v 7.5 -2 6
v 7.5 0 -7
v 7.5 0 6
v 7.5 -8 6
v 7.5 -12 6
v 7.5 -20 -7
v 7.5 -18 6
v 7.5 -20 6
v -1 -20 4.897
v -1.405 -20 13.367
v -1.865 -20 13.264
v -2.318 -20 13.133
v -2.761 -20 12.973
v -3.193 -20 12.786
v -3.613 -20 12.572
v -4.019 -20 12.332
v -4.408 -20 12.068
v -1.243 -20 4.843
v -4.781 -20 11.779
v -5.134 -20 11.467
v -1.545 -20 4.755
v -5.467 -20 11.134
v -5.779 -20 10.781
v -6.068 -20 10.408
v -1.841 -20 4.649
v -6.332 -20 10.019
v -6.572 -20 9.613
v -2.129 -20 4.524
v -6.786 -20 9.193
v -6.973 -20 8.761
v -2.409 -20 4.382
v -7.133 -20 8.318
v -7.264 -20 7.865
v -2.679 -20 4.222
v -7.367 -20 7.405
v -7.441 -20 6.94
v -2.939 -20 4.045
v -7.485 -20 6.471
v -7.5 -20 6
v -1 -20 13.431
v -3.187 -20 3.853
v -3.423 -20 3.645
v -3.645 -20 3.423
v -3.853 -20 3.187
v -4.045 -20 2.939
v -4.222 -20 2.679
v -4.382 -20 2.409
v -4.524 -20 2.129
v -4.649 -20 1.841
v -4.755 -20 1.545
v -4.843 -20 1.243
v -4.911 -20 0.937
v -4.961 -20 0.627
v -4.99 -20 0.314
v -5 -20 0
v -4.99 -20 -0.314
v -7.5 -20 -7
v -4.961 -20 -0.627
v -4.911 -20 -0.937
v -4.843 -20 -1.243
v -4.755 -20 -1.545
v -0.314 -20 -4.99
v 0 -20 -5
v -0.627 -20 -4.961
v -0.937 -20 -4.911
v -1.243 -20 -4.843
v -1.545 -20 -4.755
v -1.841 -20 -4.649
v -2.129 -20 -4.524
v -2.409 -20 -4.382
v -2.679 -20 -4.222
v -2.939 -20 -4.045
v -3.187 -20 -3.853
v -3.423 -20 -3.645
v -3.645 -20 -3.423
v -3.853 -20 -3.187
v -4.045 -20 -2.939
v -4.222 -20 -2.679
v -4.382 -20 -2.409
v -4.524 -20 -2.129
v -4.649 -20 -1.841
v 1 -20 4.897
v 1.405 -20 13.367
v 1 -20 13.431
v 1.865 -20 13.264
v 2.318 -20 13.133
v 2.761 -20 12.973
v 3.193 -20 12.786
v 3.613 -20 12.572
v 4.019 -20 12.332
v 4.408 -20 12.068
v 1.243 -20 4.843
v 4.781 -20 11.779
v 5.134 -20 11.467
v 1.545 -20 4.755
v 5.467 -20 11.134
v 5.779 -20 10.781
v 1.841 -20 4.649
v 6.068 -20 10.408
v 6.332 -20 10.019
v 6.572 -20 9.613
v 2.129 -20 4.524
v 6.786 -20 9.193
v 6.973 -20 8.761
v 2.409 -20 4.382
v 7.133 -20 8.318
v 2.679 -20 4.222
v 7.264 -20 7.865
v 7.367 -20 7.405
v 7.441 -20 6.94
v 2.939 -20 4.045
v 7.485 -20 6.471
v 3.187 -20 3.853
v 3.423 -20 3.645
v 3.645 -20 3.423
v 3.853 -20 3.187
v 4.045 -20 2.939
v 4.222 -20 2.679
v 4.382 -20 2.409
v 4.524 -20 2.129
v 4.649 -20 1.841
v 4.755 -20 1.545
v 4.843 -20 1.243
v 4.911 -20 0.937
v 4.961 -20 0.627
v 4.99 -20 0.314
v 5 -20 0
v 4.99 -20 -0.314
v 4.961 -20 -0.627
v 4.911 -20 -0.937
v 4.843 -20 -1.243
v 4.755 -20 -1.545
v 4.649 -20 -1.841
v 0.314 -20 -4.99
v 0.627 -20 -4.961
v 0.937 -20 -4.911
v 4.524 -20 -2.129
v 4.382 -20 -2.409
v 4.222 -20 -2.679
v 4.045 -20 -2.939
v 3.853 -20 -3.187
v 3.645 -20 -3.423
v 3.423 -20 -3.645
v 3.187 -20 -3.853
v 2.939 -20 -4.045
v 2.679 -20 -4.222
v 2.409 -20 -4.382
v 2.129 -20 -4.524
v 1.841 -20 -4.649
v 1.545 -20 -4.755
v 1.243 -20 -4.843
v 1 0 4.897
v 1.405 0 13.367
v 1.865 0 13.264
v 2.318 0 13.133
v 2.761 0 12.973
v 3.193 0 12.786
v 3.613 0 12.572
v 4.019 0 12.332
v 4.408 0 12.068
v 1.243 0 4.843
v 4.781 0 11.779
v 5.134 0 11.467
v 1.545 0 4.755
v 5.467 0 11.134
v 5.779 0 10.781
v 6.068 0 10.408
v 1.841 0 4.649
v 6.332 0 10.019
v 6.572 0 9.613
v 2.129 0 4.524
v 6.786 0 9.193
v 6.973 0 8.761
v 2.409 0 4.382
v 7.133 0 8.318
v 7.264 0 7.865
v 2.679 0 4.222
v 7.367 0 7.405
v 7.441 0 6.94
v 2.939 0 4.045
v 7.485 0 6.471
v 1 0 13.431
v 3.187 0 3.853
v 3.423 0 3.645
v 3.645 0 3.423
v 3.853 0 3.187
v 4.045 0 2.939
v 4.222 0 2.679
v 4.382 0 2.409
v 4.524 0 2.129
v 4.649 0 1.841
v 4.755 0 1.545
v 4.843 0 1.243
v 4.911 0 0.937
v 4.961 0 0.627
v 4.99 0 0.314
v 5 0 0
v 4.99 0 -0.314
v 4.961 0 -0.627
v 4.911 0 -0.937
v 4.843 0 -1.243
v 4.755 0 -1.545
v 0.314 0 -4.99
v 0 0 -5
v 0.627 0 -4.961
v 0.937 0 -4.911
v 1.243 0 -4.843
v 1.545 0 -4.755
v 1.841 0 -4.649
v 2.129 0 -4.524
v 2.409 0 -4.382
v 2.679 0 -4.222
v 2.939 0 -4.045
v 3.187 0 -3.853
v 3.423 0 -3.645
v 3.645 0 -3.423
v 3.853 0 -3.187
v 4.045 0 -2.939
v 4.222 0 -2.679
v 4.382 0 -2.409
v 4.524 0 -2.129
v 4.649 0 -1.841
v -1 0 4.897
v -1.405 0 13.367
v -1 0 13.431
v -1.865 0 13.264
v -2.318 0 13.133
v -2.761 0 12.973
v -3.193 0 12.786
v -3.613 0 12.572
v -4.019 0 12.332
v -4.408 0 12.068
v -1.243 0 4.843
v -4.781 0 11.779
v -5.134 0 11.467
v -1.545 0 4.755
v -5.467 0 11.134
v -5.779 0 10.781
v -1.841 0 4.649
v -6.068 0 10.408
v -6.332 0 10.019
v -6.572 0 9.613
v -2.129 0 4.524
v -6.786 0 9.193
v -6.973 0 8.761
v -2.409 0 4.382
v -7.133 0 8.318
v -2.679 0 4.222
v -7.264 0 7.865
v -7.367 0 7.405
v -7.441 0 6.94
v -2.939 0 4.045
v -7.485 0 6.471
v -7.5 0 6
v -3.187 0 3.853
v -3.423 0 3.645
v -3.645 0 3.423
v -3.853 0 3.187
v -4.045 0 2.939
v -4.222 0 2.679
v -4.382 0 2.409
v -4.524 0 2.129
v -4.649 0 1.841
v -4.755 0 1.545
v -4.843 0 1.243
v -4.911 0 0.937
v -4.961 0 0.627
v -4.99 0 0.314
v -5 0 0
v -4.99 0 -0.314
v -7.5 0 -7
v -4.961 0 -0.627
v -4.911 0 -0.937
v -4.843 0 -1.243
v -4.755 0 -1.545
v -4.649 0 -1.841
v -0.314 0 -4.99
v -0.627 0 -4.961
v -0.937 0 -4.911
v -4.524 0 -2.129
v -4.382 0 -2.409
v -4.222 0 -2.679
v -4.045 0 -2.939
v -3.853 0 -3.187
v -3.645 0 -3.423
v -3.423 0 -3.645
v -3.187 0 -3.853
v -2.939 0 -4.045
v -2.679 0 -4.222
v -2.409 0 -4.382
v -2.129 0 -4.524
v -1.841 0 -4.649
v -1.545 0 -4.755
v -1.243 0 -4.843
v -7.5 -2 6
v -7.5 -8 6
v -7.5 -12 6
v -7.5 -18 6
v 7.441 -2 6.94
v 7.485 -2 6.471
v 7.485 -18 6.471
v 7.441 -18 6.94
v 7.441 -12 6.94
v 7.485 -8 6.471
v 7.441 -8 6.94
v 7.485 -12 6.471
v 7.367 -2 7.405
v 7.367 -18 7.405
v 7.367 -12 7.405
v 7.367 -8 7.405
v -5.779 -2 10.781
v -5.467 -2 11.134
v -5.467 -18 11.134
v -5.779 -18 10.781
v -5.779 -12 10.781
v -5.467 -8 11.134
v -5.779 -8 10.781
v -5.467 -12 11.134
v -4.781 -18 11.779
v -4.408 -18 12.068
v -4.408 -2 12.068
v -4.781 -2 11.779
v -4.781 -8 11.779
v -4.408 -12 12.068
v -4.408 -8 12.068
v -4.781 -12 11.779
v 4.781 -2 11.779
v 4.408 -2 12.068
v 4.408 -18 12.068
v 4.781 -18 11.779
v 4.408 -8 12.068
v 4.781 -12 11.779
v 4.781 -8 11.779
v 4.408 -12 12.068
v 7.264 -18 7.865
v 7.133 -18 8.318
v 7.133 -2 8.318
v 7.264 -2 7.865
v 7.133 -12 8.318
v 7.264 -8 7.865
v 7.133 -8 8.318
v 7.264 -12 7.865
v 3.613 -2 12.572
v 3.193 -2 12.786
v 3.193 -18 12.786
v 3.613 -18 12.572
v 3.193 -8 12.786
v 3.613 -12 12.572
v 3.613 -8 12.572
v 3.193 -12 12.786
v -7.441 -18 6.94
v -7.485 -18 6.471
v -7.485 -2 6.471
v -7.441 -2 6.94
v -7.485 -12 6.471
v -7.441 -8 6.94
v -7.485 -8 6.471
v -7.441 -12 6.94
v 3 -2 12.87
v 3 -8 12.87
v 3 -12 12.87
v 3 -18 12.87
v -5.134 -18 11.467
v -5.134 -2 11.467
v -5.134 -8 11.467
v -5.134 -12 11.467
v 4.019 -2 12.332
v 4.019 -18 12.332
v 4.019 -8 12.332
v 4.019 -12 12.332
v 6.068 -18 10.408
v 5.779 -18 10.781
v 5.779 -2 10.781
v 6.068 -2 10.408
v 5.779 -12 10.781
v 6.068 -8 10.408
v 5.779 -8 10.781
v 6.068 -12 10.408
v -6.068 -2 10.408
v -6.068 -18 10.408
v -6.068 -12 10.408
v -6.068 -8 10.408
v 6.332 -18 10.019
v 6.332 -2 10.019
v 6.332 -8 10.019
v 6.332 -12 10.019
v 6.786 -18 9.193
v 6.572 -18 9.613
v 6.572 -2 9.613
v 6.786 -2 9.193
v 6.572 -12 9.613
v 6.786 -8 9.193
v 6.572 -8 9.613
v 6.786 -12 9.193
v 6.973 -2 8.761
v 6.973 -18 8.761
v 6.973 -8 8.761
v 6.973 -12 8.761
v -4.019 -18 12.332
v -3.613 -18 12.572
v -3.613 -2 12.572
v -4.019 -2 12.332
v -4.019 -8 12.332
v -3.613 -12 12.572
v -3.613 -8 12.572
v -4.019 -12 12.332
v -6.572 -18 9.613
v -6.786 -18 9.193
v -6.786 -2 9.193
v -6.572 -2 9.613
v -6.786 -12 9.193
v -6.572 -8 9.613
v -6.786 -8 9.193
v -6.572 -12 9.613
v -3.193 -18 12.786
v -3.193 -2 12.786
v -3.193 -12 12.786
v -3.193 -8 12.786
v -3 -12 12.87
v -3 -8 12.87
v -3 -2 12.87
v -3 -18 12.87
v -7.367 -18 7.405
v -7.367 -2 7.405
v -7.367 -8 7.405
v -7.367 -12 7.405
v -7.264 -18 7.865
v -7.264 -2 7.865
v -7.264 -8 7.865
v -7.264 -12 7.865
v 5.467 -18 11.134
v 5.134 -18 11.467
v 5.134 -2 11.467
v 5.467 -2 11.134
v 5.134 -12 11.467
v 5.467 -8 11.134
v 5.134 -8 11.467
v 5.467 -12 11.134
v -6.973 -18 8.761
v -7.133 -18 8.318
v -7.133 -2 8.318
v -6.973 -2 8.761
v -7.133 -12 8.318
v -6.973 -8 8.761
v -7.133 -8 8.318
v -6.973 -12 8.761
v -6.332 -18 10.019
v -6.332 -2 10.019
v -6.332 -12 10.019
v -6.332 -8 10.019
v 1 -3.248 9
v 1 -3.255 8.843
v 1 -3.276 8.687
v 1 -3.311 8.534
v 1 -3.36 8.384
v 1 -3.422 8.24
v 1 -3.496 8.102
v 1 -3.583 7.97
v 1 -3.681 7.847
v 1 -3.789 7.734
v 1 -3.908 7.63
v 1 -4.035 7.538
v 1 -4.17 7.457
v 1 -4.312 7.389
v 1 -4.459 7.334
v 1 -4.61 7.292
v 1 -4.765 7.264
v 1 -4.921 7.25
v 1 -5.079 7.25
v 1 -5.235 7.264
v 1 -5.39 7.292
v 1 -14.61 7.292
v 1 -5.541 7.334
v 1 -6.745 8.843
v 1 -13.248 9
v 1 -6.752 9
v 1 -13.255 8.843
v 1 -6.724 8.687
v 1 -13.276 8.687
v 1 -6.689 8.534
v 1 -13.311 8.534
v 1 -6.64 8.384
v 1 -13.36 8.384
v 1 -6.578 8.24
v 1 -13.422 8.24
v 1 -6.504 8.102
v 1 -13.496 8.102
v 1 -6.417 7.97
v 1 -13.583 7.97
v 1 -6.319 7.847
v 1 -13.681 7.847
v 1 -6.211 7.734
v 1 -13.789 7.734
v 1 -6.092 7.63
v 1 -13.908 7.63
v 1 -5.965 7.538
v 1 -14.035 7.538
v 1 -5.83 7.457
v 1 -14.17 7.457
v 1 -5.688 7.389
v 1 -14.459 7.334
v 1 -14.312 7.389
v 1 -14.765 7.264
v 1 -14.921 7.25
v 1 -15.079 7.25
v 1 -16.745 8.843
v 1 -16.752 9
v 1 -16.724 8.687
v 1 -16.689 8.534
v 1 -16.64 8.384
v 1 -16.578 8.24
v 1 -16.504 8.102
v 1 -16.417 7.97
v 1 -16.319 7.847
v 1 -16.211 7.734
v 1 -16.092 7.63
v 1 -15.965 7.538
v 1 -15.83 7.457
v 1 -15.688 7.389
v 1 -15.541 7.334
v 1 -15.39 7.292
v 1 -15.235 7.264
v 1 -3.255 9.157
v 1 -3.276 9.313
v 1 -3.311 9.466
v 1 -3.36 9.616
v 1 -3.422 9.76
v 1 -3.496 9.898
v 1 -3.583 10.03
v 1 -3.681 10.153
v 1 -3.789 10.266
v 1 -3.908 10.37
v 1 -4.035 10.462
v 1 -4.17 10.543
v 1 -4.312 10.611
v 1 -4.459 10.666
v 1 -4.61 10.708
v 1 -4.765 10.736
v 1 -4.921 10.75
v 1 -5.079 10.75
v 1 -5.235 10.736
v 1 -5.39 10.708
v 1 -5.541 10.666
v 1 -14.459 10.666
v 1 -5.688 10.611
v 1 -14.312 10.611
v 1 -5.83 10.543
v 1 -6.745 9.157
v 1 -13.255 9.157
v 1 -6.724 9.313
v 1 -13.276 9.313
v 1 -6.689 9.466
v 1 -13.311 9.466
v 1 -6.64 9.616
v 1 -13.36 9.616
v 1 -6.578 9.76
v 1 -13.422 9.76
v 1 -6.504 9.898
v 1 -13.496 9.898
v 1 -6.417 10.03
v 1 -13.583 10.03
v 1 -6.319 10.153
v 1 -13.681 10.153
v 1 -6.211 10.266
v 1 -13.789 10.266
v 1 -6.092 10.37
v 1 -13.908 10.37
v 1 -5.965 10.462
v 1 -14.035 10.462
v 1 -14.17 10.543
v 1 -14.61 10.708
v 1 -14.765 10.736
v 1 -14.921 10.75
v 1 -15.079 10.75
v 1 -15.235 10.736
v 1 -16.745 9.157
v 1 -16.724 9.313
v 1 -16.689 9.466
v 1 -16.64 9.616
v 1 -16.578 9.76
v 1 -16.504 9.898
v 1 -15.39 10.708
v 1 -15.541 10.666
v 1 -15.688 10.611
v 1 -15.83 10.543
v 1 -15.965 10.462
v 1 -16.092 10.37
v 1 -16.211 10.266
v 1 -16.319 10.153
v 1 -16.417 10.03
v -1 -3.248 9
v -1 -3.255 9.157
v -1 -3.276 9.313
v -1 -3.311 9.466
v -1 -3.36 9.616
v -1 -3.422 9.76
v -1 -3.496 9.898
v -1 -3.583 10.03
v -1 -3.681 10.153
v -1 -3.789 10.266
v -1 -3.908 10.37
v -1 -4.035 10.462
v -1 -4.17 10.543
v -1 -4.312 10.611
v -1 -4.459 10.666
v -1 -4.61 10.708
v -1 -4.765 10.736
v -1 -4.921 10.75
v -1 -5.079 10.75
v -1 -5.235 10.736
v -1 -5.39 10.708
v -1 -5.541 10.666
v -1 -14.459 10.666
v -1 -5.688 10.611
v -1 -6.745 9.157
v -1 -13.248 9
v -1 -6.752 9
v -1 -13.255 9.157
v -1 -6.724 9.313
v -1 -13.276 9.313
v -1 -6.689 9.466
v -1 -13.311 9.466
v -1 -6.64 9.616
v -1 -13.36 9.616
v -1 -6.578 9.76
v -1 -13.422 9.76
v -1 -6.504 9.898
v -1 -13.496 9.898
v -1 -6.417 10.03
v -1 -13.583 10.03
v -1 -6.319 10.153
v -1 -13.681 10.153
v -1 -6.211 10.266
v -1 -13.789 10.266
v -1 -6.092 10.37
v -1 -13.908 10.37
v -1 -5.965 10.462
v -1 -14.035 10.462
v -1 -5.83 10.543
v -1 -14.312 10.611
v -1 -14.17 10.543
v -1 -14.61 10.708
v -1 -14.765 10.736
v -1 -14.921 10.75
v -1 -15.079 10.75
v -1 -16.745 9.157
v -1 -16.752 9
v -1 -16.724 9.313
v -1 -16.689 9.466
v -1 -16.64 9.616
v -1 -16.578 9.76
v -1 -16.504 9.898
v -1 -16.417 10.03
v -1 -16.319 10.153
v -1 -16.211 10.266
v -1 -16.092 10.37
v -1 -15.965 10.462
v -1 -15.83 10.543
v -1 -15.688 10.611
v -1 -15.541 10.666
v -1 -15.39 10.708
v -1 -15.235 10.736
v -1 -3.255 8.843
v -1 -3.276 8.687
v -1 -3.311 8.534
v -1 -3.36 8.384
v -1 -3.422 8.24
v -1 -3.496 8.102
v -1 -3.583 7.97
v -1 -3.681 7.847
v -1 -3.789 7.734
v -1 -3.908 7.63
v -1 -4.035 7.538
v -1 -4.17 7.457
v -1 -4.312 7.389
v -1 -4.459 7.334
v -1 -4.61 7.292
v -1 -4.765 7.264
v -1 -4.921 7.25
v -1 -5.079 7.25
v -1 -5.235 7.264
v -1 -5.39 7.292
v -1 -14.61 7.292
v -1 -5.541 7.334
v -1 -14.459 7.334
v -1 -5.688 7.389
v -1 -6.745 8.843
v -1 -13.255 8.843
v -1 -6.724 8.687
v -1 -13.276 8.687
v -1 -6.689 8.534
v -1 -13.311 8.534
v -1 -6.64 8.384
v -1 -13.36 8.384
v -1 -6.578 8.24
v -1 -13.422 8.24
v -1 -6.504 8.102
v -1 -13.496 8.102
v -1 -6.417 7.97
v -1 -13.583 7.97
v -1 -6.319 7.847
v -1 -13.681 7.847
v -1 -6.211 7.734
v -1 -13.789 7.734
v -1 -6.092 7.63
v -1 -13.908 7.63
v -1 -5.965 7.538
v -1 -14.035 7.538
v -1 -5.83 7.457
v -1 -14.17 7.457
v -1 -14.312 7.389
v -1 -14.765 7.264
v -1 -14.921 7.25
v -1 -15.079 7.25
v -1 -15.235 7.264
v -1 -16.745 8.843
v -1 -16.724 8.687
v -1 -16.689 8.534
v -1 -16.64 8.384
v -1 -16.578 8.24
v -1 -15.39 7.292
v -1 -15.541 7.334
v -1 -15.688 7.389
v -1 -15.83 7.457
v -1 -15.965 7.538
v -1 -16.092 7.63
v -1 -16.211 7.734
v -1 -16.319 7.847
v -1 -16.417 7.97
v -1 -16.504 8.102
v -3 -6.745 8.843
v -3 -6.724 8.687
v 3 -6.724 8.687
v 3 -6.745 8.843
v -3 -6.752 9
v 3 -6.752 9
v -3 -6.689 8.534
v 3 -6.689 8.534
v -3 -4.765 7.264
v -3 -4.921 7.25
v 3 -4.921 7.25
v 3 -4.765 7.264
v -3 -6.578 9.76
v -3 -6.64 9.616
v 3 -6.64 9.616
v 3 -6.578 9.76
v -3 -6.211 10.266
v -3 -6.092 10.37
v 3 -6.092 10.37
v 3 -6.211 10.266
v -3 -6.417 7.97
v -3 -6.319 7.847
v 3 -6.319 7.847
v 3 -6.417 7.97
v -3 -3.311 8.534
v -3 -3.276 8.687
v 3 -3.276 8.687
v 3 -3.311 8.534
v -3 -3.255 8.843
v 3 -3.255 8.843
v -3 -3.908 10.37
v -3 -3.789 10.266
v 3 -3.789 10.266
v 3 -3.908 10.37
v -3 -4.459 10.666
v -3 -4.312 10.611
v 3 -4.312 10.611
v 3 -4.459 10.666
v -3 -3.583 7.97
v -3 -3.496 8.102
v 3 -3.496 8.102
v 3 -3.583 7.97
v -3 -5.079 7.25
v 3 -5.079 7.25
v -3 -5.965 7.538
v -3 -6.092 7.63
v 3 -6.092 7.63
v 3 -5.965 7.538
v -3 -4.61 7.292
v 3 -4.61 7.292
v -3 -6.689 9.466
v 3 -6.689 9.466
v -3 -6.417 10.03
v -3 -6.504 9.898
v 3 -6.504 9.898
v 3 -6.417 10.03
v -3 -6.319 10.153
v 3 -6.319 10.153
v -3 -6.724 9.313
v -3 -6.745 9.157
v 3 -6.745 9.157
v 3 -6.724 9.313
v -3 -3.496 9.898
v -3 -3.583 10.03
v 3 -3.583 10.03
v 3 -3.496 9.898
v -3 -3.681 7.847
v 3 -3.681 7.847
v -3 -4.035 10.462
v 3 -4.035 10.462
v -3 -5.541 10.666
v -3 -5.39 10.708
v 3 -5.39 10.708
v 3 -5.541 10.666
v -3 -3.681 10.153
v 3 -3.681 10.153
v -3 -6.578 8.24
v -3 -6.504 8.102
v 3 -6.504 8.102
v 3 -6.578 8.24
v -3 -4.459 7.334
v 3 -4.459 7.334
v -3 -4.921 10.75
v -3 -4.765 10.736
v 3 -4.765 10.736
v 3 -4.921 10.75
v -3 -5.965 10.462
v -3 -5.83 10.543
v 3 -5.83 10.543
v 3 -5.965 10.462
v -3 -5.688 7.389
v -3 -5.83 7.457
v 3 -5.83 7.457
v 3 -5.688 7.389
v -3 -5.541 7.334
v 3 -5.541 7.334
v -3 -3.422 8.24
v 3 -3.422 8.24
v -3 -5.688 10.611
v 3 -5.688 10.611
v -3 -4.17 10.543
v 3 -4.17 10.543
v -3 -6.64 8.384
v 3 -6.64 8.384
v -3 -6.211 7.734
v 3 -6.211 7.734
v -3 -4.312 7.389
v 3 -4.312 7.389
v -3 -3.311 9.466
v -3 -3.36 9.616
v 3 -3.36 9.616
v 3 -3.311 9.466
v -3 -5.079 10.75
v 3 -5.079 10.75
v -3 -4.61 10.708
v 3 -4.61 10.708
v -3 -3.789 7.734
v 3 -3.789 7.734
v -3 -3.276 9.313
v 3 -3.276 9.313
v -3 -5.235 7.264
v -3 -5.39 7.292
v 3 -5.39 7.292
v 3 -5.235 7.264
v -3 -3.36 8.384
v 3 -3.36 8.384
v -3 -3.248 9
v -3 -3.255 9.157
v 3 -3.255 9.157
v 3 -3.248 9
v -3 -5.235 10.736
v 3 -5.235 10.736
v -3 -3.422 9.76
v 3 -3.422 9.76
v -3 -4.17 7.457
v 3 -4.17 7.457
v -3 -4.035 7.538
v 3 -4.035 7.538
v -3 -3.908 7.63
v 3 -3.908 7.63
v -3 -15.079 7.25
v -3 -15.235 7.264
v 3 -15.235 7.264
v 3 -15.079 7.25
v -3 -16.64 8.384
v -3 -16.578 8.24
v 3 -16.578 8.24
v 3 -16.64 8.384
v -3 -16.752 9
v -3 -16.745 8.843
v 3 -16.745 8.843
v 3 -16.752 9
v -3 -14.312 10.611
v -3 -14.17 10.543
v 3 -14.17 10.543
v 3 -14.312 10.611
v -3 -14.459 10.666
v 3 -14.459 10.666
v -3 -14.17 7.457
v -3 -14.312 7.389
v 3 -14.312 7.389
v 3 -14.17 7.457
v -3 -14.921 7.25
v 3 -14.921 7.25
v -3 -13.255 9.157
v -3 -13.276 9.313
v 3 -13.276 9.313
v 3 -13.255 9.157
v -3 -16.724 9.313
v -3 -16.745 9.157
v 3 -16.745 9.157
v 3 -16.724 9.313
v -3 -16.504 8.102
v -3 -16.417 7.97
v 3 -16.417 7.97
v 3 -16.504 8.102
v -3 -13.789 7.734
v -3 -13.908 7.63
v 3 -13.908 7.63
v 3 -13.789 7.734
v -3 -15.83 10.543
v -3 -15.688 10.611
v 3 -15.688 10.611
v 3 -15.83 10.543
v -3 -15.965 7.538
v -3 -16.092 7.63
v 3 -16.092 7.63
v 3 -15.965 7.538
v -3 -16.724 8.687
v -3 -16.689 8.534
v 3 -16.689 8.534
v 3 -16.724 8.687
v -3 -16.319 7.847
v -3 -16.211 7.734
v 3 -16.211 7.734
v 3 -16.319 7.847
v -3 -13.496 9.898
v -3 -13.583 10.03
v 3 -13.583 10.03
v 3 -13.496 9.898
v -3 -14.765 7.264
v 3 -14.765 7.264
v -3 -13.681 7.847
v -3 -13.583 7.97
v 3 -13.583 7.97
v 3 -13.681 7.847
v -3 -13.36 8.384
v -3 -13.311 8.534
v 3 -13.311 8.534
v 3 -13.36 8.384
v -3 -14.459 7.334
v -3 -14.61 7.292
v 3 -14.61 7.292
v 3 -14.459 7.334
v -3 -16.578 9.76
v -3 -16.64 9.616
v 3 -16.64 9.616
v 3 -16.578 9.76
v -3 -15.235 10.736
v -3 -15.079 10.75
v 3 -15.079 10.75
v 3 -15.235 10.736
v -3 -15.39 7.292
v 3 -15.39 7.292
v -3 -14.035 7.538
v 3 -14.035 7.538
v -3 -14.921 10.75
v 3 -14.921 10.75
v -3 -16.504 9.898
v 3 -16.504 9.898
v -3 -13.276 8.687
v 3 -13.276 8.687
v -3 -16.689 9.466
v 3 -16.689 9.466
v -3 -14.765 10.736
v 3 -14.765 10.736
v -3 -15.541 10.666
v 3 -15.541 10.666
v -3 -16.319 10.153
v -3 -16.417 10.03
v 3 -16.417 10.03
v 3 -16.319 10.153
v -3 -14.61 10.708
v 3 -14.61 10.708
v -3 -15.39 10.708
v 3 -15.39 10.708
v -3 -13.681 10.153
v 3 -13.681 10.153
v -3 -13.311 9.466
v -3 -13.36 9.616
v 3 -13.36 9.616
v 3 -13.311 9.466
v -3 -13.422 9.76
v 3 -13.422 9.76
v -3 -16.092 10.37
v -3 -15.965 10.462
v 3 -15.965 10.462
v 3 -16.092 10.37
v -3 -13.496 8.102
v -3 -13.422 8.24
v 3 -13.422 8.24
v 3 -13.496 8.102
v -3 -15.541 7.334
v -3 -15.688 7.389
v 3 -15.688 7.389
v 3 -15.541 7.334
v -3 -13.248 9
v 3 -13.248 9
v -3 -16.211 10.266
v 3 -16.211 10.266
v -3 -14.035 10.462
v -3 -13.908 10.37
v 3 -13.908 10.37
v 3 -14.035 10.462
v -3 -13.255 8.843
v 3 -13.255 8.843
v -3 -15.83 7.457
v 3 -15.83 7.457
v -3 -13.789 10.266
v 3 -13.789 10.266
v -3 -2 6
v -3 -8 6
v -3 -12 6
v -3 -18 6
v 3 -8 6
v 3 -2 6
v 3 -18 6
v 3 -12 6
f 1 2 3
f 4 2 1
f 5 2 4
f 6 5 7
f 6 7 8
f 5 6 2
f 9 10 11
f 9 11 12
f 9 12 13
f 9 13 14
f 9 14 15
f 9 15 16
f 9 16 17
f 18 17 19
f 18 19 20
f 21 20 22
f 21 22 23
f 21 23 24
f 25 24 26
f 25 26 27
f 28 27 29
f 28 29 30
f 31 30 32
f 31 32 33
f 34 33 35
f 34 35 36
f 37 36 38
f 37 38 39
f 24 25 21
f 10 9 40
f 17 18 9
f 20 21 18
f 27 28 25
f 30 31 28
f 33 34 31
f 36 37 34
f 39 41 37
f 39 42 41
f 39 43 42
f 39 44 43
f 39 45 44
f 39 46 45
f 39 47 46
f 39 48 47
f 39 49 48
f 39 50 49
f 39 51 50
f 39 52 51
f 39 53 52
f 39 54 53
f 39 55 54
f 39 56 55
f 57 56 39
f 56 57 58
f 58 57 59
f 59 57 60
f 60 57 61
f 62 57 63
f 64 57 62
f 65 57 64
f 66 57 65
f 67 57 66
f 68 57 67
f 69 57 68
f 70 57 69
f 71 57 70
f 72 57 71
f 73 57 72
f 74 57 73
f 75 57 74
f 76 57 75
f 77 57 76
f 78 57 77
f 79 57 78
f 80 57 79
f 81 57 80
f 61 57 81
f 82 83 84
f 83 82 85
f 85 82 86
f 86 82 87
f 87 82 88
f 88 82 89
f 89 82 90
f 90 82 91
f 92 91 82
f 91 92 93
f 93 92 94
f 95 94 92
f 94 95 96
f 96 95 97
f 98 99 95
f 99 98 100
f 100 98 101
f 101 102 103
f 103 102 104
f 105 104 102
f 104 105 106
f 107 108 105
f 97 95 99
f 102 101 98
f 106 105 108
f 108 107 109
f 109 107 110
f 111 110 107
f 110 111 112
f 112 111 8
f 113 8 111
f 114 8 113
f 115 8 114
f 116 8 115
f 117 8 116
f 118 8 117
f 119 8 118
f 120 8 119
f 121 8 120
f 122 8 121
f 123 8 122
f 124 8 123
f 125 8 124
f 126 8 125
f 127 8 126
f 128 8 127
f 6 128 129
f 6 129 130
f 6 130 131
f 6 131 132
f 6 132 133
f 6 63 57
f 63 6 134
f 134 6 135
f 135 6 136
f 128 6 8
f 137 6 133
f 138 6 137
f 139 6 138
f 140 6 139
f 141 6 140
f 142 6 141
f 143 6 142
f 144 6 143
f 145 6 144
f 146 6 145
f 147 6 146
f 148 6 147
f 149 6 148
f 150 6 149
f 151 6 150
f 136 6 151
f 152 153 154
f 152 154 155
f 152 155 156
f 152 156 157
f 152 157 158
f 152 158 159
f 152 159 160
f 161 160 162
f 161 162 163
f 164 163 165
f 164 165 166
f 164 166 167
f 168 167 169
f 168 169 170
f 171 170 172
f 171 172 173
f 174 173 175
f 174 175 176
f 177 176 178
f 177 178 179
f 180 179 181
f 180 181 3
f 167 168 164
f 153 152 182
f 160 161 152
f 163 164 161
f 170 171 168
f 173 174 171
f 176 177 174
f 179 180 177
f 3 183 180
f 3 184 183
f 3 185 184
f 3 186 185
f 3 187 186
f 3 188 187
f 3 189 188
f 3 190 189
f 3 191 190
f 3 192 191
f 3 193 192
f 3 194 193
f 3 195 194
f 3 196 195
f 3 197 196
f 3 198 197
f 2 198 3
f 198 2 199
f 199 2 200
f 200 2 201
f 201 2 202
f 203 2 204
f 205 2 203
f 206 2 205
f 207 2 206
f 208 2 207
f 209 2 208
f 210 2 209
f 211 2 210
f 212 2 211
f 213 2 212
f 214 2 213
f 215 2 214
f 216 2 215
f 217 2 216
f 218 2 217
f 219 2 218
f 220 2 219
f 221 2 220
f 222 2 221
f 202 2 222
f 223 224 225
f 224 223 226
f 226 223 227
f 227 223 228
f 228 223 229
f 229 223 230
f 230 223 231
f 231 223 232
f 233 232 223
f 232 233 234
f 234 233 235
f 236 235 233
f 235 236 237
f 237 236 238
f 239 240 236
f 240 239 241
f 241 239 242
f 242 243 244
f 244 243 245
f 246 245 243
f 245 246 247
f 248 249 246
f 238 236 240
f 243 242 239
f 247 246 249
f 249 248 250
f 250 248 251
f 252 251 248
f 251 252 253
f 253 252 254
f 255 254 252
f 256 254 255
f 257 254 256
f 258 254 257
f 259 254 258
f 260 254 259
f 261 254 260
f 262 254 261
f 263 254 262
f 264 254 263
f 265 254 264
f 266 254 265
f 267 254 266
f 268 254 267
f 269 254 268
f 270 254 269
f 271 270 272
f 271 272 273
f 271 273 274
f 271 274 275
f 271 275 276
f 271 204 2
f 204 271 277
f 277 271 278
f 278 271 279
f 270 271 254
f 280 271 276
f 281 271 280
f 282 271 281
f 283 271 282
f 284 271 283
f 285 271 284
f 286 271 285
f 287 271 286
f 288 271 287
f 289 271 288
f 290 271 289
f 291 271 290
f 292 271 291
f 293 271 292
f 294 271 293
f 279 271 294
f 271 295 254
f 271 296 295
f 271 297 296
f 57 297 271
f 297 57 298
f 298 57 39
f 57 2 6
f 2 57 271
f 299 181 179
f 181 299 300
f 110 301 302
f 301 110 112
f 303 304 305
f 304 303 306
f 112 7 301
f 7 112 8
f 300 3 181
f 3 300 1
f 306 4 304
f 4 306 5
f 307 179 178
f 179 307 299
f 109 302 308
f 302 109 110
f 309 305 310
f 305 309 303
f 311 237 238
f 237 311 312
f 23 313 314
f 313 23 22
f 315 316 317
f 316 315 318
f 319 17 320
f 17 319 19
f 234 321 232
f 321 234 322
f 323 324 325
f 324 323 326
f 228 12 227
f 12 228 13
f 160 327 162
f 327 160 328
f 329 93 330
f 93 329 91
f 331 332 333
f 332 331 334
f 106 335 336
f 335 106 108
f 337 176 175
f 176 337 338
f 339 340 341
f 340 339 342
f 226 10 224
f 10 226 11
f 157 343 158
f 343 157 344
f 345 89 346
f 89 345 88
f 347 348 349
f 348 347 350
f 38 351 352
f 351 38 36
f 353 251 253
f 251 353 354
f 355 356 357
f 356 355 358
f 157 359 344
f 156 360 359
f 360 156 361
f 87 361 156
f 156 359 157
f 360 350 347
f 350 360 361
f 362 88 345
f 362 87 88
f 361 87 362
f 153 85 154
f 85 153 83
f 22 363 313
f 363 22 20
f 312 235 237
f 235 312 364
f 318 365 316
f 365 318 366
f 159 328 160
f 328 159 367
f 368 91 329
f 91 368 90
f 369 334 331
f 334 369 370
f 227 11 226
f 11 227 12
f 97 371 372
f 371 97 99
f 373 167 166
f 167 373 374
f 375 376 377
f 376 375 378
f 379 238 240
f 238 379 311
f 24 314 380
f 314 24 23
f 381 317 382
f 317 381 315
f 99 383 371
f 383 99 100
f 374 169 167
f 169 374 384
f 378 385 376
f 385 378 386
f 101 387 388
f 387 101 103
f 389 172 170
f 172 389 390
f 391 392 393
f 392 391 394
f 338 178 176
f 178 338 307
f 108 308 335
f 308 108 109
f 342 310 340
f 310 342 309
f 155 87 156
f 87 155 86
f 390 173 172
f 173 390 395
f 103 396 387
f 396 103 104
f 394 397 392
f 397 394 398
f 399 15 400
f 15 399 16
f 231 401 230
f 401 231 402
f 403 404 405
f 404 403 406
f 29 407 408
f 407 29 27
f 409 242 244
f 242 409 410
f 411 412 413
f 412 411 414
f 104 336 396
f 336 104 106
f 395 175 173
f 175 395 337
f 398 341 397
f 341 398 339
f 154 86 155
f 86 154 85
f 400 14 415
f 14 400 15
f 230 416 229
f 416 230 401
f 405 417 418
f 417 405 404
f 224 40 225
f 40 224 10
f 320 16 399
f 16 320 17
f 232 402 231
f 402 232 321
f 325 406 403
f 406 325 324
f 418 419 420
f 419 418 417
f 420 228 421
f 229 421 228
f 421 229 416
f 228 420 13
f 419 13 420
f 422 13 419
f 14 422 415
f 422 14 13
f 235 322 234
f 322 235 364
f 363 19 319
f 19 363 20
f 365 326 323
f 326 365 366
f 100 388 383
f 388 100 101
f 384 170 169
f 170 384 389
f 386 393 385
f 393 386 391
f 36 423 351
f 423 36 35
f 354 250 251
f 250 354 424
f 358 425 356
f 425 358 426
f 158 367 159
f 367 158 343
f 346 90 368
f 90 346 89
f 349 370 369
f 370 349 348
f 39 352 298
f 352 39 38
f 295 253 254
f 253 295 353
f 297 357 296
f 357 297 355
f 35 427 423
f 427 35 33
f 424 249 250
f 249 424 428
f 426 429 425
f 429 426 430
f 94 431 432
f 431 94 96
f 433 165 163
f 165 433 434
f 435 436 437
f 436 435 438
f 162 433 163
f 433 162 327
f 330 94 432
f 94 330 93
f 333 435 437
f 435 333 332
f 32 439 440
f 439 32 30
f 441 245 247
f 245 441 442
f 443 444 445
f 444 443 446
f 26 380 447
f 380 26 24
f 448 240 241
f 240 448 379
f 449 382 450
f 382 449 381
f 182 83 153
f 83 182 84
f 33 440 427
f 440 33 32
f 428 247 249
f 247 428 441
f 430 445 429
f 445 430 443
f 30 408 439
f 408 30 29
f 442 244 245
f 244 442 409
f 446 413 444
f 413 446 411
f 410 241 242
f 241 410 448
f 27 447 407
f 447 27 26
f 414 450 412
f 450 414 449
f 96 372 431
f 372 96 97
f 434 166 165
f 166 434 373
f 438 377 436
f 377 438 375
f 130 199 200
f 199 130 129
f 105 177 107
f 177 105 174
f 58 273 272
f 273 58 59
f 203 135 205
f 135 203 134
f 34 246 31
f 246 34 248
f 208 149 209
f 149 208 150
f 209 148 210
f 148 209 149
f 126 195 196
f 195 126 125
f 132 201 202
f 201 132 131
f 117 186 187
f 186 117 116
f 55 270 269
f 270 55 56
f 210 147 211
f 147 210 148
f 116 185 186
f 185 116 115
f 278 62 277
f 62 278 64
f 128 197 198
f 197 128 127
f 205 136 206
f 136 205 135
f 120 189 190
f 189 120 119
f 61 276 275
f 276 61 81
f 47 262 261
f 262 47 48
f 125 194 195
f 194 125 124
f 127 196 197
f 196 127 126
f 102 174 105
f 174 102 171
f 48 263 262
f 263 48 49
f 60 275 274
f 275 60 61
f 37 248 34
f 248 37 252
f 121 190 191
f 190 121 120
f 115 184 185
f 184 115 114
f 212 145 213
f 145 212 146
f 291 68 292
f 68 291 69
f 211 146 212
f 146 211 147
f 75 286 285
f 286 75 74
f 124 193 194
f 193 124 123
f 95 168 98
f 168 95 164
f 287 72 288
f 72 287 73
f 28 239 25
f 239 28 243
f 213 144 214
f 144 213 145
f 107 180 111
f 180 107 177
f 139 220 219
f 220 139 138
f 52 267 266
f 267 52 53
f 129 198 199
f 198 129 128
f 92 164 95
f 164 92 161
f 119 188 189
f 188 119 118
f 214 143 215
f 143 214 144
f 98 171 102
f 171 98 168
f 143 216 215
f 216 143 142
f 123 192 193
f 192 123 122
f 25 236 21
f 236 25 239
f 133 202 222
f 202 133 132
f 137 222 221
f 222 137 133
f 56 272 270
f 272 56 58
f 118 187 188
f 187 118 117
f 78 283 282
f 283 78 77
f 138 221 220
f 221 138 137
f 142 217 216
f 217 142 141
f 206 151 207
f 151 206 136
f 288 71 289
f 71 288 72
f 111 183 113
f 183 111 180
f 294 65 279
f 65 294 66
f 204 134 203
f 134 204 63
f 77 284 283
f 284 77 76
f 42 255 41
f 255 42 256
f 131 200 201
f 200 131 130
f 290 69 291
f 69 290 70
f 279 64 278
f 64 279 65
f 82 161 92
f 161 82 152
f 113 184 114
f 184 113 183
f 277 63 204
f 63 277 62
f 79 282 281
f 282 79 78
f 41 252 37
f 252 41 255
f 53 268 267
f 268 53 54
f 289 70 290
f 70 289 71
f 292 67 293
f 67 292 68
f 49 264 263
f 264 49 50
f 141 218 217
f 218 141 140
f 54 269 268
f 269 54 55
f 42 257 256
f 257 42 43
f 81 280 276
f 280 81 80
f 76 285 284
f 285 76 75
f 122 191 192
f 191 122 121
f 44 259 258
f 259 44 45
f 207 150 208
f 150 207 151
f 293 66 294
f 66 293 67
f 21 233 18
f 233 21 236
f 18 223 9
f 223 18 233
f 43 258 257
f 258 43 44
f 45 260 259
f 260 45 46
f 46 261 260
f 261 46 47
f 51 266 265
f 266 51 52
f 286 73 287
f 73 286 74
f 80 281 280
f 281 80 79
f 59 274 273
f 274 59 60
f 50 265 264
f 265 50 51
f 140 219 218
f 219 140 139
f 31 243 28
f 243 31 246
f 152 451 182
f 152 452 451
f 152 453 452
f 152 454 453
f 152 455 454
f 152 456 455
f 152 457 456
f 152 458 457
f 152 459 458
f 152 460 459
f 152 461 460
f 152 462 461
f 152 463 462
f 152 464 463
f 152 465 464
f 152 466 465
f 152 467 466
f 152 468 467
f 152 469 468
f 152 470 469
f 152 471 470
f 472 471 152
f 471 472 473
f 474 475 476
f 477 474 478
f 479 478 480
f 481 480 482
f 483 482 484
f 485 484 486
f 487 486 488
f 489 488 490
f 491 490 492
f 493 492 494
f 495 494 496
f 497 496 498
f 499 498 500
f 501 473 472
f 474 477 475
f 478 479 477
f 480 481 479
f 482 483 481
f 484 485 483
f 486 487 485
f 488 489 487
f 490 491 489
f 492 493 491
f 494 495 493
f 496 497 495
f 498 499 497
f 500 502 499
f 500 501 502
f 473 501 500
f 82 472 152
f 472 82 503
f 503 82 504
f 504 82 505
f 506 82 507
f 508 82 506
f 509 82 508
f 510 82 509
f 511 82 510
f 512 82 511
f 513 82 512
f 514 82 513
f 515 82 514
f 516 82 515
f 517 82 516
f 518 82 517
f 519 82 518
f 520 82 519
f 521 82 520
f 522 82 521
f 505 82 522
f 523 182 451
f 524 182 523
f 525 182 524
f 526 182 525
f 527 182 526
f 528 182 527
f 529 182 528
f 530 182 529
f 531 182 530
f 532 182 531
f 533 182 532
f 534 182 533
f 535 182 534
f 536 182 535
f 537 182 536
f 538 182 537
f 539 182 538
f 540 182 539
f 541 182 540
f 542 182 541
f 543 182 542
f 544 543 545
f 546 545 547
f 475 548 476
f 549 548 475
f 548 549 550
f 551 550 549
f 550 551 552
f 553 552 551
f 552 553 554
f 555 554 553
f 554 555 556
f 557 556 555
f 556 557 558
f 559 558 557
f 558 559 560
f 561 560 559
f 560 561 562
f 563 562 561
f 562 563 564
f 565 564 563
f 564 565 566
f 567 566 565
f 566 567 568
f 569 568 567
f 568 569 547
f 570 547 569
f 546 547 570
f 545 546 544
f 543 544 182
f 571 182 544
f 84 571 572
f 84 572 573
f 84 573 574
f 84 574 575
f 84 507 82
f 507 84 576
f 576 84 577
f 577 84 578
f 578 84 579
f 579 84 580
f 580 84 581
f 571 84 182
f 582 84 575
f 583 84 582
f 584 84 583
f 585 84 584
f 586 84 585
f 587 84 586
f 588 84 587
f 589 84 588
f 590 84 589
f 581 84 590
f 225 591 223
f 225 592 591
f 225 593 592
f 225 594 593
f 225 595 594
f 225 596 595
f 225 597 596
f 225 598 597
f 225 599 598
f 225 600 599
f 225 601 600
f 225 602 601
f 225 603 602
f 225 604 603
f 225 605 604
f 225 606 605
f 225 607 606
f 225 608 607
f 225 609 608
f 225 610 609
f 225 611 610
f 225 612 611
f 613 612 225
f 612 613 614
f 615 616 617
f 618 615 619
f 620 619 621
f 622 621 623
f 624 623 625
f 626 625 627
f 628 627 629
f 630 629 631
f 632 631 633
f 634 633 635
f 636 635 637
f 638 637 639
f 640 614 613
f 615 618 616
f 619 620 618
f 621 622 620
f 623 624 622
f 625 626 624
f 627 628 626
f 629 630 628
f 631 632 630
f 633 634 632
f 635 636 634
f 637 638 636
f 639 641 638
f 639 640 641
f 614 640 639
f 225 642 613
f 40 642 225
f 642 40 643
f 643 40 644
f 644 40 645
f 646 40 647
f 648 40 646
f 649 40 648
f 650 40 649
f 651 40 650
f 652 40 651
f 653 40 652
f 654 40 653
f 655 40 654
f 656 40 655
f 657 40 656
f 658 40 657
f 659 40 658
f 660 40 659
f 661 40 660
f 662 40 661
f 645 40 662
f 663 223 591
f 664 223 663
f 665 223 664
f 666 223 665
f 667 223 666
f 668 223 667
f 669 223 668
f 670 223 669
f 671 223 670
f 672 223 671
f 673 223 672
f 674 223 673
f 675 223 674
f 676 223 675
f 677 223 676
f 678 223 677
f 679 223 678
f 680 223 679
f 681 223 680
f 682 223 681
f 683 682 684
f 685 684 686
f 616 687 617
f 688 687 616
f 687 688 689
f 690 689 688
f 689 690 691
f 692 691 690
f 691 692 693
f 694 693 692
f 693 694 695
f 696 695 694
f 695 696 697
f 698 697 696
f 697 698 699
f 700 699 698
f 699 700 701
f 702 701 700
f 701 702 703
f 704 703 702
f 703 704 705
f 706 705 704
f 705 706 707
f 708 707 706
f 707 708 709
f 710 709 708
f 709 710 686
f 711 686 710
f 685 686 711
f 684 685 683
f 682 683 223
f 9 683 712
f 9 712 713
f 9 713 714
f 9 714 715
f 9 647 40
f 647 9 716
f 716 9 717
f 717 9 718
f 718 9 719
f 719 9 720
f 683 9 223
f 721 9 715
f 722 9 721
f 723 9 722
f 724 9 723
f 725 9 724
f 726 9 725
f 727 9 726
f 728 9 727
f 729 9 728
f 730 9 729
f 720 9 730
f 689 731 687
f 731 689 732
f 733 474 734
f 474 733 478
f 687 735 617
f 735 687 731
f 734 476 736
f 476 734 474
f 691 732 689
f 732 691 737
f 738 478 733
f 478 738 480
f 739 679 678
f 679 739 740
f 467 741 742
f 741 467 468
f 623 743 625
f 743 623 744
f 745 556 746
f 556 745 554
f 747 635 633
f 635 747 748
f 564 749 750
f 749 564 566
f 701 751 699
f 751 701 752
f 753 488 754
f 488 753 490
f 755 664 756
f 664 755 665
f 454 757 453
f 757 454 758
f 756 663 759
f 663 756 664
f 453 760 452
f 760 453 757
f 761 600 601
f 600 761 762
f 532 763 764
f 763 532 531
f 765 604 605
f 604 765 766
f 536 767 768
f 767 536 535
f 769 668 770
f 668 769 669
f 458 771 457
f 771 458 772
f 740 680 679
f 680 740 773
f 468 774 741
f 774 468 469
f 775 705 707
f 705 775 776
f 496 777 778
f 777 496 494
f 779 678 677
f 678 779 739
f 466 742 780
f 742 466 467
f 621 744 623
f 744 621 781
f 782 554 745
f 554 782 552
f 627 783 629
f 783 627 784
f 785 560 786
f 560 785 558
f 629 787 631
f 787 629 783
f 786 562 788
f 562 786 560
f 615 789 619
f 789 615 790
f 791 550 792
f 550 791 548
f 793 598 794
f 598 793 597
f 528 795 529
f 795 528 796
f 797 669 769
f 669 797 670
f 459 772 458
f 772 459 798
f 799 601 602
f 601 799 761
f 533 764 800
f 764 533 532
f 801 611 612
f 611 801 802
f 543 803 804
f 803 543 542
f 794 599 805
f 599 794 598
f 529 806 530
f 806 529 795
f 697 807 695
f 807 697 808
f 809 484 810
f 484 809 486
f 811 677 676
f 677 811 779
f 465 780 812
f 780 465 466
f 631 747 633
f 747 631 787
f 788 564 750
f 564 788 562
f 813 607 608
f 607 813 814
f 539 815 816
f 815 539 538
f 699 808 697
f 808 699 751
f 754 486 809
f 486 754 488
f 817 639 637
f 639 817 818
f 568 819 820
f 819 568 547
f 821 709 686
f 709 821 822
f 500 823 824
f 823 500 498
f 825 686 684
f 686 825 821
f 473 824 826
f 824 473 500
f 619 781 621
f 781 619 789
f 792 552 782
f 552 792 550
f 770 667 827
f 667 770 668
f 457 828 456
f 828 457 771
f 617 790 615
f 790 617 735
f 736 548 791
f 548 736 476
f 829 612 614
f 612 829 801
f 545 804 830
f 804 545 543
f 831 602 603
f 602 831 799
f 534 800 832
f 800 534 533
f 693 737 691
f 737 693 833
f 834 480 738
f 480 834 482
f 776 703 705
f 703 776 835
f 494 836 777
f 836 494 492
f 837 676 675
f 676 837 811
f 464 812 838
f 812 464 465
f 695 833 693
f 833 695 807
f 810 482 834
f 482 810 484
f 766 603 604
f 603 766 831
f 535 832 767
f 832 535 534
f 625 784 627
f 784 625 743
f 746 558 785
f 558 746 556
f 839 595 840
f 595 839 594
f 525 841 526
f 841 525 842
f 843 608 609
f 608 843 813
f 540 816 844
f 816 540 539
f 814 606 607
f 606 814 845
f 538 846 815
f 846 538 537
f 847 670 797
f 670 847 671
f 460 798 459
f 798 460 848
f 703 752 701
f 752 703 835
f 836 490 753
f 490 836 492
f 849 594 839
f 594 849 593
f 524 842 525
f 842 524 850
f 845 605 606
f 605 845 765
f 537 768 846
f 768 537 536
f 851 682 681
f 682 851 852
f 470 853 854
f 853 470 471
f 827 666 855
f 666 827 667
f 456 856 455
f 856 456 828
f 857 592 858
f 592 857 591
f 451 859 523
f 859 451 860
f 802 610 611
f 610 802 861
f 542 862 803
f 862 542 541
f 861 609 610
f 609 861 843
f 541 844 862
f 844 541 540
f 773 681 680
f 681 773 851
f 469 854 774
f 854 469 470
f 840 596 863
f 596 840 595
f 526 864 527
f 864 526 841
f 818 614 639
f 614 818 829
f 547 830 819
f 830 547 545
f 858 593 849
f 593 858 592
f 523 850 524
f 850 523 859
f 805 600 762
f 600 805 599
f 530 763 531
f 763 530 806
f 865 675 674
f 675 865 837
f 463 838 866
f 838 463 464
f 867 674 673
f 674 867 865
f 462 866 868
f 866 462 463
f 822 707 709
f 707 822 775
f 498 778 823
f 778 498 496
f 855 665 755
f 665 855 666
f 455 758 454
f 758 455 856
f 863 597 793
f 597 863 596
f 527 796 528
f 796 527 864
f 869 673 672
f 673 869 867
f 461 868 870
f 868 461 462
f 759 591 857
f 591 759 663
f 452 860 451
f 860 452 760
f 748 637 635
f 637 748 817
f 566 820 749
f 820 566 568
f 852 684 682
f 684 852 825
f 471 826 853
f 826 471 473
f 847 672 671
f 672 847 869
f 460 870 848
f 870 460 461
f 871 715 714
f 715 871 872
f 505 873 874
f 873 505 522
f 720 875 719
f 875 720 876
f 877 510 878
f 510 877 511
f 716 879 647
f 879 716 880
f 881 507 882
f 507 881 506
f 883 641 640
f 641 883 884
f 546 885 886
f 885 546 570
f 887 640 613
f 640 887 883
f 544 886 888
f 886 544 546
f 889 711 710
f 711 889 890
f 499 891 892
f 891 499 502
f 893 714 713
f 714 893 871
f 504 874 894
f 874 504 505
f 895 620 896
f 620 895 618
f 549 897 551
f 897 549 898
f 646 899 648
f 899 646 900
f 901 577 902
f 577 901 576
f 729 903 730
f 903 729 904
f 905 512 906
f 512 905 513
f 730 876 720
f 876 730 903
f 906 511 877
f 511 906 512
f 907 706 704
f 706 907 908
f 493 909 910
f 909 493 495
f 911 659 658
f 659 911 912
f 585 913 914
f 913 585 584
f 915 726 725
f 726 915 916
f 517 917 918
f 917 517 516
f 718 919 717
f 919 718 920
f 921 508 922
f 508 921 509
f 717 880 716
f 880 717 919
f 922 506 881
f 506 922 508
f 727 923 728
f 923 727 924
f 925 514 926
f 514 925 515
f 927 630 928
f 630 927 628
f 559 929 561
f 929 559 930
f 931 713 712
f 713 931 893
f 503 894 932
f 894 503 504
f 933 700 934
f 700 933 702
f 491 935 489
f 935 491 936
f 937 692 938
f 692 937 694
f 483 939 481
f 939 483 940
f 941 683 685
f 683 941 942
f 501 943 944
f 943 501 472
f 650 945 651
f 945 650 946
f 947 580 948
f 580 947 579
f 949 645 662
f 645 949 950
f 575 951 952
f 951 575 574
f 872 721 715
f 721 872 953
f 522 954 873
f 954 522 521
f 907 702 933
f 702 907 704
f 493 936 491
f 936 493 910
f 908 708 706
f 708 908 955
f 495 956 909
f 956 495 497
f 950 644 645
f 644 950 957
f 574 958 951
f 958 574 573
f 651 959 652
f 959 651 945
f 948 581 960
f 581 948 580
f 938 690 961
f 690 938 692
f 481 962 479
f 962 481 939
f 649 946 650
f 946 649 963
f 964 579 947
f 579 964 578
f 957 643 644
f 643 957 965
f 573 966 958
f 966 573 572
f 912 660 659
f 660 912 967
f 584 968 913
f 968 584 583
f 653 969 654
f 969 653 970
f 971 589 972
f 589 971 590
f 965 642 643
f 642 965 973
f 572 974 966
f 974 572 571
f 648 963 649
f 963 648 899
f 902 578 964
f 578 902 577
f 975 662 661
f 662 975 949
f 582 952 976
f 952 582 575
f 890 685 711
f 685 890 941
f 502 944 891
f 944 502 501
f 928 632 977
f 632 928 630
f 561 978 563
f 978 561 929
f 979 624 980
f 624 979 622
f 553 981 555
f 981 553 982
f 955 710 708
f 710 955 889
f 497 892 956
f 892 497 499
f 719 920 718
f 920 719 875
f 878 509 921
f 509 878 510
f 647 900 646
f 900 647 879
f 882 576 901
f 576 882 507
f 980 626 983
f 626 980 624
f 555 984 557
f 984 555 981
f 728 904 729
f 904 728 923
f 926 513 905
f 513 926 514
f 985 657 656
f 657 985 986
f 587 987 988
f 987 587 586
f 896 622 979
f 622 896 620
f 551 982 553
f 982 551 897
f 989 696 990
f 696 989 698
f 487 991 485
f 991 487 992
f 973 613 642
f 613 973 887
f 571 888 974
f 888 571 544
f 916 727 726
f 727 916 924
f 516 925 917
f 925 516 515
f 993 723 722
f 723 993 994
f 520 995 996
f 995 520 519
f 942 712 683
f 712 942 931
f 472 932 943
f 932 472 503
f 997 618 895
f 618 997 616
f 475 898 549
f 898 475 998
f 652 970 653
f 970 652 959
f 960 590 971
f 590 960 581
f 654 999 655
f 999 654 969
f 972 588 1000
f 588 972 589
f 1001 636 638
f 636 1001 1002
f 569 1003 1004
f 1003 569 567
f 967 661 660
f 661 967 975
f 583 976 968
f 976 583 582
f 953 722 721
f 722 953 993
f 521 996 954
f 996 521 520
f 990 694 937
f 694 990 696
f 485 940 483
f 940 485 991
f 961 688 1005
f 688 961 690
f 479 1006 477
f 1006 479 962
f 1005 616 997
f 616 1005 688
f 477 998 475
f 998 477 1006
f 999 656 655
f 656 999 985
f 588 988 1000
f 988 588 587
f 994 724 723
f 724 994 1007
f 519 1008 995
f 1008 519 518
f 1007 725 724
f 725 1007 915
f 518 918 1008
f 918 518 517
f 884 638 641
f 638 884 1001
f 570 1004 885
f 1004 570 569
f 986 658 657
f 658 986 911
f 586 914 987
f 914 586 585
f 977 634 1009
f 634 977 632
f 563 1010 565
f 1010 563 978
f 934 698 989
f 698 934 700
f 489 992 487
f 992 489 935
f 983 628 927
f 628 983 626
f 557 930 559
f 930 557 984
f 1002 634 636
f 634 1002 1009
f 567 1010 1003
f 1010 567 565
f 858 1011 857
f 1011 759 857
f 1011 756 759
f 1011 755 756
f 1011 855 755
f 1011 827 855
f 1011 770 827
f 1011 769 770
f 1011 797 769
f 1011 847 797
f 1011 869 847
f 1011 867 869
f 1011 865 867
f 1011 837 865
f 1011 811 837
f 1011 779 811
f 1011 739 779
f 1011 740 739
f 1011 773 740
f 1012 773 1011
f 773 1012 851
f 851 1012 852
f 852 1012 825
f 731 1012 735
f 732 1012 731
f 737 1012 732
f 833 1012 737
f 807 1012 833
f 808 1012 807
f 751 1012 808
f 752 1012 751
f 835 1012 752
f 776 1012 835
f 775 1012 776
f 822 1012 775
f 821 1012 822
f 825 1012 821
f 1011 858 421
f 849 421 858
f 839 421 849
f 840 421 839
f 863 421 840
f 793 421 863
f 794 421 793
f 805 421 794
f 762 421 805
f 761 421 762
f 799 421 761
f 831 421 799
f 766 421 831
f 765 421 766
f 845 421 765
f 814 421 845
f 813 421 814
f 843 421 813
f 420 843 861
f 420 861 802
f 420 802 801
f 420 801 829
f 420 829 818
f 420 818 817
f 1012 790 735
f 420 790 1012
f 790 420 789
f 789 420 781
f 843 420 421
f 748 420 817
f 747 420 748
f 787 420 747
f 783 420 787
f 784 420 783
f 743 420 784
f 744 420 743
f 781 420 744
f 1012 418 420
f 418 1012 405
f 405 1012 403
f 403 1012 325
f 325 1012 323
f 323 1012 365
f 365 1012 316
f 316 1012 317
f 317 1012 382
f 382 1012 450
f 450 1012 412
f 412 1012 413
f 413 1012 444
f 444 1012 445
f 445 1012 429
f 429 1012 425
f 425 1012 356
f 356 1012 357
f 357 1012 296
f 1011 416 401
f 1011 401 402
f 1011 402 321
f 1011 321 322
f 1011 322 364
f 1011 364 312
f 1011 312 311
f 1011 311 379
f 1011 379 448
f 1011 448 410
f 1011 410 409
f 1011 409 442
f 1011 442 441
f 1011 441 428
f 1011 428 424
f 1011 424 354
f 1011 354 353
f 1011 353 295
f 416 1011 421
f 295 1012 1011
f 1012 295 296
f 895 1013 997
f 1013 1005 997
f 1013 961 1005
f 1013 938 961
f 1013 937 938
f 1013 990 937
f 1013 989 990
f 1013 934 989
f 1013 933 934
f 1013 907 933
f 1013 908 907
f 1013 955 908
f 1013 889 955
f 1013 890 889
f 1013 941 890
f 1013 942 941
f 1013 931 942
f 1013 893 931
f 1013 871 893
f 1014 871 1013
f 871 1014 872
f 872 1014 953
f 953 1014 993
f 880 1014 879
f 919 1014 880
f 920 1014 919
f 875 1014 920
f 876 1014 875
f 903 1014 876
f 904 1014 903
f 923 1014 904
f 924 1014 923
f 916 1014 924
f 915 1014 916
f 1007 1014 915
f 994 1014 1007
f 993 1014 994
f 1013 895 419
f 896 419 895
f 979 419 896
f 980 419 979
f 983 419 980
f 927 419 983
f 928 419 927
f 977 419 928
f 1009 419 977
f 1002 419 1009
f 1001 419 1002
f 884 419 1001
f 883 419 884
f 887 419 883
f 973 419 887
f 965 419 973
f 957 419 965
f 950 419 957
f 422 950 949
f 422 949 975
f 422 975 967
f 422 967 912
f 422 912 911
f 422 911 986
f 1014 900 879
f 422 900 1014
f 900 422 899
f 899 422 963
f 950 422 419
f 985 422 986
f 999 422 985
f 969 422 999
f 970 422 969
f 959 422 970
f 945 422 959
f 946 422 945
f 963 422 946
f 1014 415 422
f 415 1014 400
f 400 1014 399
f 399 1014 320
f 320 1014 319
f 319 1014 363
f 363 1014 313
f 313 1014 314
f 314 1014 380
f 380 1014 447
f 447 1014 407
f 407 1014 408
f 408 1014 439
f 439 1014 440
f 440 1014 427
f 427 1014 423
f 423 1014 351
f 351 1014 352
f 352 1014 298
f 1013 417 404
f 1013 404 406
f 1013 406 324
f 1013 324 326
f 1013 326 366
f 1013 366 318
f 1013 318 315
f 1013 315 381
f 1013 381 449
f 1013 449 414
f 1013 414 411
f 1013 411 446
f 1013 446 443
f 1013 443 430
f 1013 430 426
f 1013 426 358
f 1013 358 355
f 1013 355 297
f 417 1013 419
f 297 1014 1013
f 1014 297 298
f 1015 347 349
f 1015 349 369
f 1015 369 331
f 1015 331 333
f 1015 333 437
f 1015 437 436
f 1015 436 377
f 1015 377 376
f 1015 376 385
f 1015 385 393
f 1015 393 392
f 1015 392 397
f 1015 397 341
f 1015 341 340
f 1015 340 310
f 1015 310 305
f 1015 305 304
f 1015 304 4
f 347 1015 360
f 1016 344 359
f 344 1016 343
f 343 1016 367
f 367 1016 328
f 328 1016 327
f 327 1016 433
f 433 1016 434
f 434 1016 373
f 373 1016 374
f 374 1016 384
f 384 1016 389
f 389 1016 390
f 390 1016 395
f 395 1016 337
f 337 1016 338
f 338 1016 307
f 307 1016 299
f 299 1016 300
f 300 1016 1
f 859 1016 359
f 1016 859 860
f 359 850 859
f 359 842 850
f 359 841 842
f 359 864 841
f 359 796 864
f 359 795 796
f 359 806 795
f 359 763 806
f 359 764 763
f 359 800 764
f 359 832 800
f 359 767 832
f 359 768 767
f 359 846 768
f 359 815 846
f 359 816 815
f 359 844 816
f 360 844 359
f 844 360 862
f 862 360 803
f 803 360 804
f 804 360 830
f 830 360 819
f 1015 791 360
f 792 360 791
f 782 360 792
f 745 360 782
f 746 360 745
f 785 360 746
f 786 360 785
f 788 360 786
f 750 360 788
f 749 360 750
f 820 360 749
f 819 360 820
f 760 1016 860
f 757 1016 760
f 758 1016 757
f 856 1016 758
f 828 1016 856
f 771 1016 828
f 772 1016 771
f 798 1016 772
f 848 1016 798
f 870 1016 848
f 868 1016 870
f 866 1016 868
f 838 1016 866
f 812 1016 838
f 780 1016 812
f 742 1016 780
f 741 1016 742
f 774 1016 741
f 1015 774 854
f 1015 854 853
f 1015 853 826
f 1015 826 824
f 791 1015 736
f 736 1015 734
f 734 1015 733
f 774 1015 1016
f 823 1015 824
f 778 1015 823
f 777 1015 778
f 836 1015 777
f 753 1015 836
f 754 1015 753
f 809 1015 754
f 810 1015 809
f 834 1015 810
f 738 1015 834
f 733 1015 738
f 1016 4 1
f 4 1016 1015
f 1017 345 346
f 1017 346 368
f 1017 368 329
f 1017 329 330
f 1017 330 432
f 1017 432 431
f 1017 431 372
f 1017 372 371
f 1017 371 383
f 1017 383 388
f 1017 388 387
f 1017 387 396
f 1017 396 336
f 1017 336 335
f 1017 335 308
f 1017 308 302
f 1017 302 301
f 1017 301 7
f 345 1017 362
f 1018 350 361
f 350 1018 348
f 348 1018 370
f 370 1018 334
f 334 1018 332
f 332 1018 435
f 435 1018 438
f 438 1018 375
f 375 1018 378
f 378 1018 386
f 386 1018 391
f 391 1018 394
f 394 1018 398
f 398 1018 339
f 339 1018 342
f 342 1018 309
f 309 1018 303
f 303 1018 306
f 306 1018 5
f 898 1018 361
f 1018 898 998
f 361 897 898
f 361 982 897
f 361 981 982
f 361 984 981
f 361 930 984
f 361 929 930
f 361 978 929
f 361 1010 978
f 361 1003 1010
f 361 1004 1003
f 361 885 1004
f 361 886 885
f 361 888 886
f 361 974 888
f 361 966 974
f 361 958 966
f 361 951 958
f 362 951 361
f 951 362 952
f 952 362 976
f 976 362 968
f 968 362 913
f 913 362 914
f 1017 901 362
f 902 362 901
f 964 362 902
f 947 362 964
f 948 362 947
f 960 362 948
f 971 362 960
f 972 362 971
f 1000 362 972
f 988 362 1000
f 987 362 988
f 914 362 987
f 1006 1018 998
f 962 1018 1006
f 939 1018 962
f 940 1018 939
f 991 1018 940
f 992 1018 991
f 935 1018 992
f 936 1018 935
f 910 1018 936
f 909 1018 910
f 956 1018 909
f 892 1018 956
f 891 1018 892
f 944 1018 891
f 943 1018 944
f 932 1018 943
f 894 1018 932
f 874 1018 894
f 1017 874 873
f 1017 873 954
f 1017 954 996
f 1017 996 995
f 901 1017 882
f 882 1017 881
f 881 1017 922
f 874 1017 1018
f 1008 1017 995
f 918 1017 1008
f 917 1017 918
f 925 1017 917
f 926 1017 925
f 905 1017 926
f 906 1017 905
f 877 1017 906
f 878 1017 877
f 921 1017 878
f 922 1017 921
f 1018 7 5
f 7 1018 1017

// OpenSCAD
// file: ../parts/lmu10.scad
module lmu10(hollow = false)
{
    difference()
    {
        cylinder(d = 20, h = 29, $fn = 100);
        if (hollow == true)
        {
            cylinder(d = 10, h = 29, $fn = 100);
        }
    }
}
// file: ../parts/nema17MotorPlate.scad
nema17PlateWidth = 42.3;

module nema17MotorPlate(h = 2)
{
    difference()
    {
        cube([42.3, 42.3, h]);

        translate([42.3 / 2, 42.3 / 2, -.1])
            polyhole(d = 22.5, h = h + .2);
        
        o = (42.3 - 31) / 2;

        translate([o, o, -.1])
            hole3mm(h = h + .2);
        translate([o, 42.3 - o, -.1])
            hole3mm(h = h + .2);
        translate([42.3 - o, o, -.1])
            hole3mm(h = h + .2);            
        translate([42.3 - o, 42.3 - o, -.1])
            hole3mm(h = h + .2);
    }
}
// file: ../functions.scad
module polyhole(h, d)
{
    n = max(round(20 * d), 3);

    rotate([0,0,180])
    {
        cylinder(h = h, r = (d / 2) / cos (180 / n), $fn = n);
    }
}

module triangle(out, up, thick, center=false)
{
    centroid = center ? [-a_len/3, -o_len/3, -depth/2] : [0, 0, 0];
    rotate([0, -90, 0])
    translate(centroid) linear_extrude(height=thick)
    {
        polygon(points=[[0,0],[0,out],[up,0]], paths=[[0,1,2]]);
    }
}
// file: ../materials.scad
module extrusionVertical(x = 20, y = 20, l)
{
    difference()
    {
        cube([x, y, l]);

        translate([x-10 - 5/2, -.1, -.1])
            cube([5, 2, l+.2]);

        translate([x-10 - 5/2, y - 2, -.1])
            cube([5, 2.1, l+.2]);

        translate([x - 3, 10 - 5/2, -.1])
            cube([3.1, 5, l+.2]);

        translate([-0.1, 10-5/2, -.1])
            cube([3.1, 5, l+.2]);
    }
}

module extrusionHorizontalY(x = 20, y = 20, l)
{
    difference()
    {
        cube([x, l, y]);

        translate([x-10 - 5/2, .1, -.1])
            cube([5, l + .2, 2]);

        translate([x-10 - 5/2, -.1, y-2])
            cube([5, l + .2, 2.1]);

        translate([-.1, -.1, 10 - 5/2])
            cube([2.1, l + .2, 5]);
        translate([-.1, -.1, y - 10 - 5/2])
            cube([2.1, l + .2, 5]);

        translate([x - 3, -1, 10 - 5/2])
            cube([3.1, l + .2, 5]);
        translate([x - 3, -1, y - 10 - 5/2])
            cube([3.1, l + .2, 5]);
    }
}

module extrusionHorizontalX(x = 20, y = 20, l)
{
    difference()
    {
        cube([l, x, y]);

        translate([-.1,x-10 - 5/2, -.1])
            cube([l + .2, 5, 2]);

        translate([-.1, x-10 - 5/2, y-2])
            cube([l + .2, 5, 2.1]);

        translate([-.1, -.1, 10 - 5/2])
            cube([l + .2, 2.1, 5]);
        translate([-.1, -.1, y - 10 - 5/2])
            cube([l + .2, 2.1, 5]);

        translate([-.1, x - 3, 10 - 5/2])
             cube([l + .2, 3.1, 5]);
        translate([-.1, x - 3, y - 10 - 5/2])
             cube([l + .2, 3.1, 5]);
    }
}

module tenMMBar(l)
{
    cylinder(d = 10, h = l, $fn = 100);
}

module pomNutMount(h = 3.5)
{
    polyhole(d = 10.5, h = h);
    pomNutHoles(h = h);
}

module pomNutHoles(h) {
    translate([-7.75, 0, 0])
        hole3mm(h = h);
    translate([0, -7.75, 0])
        hole3mm(h = h);
    translate([7.75, 0, 0])
        hole3mm(h = h);
    translate([0, 7.75, 0])
        hole3mm(h = h);
}

module pomNut() {
    difference() {
        union() {
            polyhole(d = 10.5, h = 10.5);
            translate([0, 0, 1.5])
                polyhole(d = 22, h = 3.5);
        }

        translate([0, 0, -.1])
            polyhole(d = (10.5 - (1.8*2)), h = 10.7);

        translate([0, 0, 1.4]) {
            pomNutHoles(h = 3.7);
        }
    }
}

module bearings12mm()
{
    difference() {
        union() {
            polyhole(d = 15, h = 1.5);
            polyhole(d = 12, h = 10);
            translate([0,0,8.5])
                polyhole(d = 15, h = 1.5);
        }
        translate([0, 0, -.1])
            polyhole(d = 4, h = 10.2);
    }
}
// file: ../parts/railClamp.scad
// this is where the 10mm rods go into to be clamped down

module railClamp(l = 20, d = 10, h = 10)
{
    difference(){        
        union()
        {
            translate([-7.5, -7, 0])
                cube([15, 12 + h, l]);

            translate([0, 5 + h, 0])
                cylinder(d = 15, h = l + 0, $fn=100);
        }

        translate([0, h - 1, -1])
            tenMMBar(l = l + 2);
            
        translate([-1, h, -.1])
            cube([2, 14, l + .2]);
        
        // screw holes
        translate([-7, h + 8, 5])
            rotate([0, 90, 0])
                hole3mm(h = 100);
        translate([-7, h + 8, 15])
            rotate([0, 90, 0])
                hole3mm(h = 100);

        //screw insets
        translate([-8, h + 5, 2])
            cube([5, 8, 6]);
        translate([-8, h + 5, 15 - 3])
            cube([5, 8, 6]);

        translate([3, h + 5, 2])
            cube([5, 8, 6]);
        translate([3, h + 5, 15 - 3])
            cube([5, 8, 6]);
    }
}
// file: ../common.scad
include <materials.scad>
include <functions.scad>
include <parts/nema17MotorPlate.scad>
include <parts/lmu10.scad>

zGantryBracketX = 20;

module hole5mm(h = 2.2) {
    polyhole(d = 5.5, h = h);
}

module hole3mm(h = 2.2) {
    polyhole(d = 3.5, h = h);
}
// main file
include <../common.scad>
include <../parts/railClamp.scad>

rotate([90,0,0])
    railClamp(h = 1);
